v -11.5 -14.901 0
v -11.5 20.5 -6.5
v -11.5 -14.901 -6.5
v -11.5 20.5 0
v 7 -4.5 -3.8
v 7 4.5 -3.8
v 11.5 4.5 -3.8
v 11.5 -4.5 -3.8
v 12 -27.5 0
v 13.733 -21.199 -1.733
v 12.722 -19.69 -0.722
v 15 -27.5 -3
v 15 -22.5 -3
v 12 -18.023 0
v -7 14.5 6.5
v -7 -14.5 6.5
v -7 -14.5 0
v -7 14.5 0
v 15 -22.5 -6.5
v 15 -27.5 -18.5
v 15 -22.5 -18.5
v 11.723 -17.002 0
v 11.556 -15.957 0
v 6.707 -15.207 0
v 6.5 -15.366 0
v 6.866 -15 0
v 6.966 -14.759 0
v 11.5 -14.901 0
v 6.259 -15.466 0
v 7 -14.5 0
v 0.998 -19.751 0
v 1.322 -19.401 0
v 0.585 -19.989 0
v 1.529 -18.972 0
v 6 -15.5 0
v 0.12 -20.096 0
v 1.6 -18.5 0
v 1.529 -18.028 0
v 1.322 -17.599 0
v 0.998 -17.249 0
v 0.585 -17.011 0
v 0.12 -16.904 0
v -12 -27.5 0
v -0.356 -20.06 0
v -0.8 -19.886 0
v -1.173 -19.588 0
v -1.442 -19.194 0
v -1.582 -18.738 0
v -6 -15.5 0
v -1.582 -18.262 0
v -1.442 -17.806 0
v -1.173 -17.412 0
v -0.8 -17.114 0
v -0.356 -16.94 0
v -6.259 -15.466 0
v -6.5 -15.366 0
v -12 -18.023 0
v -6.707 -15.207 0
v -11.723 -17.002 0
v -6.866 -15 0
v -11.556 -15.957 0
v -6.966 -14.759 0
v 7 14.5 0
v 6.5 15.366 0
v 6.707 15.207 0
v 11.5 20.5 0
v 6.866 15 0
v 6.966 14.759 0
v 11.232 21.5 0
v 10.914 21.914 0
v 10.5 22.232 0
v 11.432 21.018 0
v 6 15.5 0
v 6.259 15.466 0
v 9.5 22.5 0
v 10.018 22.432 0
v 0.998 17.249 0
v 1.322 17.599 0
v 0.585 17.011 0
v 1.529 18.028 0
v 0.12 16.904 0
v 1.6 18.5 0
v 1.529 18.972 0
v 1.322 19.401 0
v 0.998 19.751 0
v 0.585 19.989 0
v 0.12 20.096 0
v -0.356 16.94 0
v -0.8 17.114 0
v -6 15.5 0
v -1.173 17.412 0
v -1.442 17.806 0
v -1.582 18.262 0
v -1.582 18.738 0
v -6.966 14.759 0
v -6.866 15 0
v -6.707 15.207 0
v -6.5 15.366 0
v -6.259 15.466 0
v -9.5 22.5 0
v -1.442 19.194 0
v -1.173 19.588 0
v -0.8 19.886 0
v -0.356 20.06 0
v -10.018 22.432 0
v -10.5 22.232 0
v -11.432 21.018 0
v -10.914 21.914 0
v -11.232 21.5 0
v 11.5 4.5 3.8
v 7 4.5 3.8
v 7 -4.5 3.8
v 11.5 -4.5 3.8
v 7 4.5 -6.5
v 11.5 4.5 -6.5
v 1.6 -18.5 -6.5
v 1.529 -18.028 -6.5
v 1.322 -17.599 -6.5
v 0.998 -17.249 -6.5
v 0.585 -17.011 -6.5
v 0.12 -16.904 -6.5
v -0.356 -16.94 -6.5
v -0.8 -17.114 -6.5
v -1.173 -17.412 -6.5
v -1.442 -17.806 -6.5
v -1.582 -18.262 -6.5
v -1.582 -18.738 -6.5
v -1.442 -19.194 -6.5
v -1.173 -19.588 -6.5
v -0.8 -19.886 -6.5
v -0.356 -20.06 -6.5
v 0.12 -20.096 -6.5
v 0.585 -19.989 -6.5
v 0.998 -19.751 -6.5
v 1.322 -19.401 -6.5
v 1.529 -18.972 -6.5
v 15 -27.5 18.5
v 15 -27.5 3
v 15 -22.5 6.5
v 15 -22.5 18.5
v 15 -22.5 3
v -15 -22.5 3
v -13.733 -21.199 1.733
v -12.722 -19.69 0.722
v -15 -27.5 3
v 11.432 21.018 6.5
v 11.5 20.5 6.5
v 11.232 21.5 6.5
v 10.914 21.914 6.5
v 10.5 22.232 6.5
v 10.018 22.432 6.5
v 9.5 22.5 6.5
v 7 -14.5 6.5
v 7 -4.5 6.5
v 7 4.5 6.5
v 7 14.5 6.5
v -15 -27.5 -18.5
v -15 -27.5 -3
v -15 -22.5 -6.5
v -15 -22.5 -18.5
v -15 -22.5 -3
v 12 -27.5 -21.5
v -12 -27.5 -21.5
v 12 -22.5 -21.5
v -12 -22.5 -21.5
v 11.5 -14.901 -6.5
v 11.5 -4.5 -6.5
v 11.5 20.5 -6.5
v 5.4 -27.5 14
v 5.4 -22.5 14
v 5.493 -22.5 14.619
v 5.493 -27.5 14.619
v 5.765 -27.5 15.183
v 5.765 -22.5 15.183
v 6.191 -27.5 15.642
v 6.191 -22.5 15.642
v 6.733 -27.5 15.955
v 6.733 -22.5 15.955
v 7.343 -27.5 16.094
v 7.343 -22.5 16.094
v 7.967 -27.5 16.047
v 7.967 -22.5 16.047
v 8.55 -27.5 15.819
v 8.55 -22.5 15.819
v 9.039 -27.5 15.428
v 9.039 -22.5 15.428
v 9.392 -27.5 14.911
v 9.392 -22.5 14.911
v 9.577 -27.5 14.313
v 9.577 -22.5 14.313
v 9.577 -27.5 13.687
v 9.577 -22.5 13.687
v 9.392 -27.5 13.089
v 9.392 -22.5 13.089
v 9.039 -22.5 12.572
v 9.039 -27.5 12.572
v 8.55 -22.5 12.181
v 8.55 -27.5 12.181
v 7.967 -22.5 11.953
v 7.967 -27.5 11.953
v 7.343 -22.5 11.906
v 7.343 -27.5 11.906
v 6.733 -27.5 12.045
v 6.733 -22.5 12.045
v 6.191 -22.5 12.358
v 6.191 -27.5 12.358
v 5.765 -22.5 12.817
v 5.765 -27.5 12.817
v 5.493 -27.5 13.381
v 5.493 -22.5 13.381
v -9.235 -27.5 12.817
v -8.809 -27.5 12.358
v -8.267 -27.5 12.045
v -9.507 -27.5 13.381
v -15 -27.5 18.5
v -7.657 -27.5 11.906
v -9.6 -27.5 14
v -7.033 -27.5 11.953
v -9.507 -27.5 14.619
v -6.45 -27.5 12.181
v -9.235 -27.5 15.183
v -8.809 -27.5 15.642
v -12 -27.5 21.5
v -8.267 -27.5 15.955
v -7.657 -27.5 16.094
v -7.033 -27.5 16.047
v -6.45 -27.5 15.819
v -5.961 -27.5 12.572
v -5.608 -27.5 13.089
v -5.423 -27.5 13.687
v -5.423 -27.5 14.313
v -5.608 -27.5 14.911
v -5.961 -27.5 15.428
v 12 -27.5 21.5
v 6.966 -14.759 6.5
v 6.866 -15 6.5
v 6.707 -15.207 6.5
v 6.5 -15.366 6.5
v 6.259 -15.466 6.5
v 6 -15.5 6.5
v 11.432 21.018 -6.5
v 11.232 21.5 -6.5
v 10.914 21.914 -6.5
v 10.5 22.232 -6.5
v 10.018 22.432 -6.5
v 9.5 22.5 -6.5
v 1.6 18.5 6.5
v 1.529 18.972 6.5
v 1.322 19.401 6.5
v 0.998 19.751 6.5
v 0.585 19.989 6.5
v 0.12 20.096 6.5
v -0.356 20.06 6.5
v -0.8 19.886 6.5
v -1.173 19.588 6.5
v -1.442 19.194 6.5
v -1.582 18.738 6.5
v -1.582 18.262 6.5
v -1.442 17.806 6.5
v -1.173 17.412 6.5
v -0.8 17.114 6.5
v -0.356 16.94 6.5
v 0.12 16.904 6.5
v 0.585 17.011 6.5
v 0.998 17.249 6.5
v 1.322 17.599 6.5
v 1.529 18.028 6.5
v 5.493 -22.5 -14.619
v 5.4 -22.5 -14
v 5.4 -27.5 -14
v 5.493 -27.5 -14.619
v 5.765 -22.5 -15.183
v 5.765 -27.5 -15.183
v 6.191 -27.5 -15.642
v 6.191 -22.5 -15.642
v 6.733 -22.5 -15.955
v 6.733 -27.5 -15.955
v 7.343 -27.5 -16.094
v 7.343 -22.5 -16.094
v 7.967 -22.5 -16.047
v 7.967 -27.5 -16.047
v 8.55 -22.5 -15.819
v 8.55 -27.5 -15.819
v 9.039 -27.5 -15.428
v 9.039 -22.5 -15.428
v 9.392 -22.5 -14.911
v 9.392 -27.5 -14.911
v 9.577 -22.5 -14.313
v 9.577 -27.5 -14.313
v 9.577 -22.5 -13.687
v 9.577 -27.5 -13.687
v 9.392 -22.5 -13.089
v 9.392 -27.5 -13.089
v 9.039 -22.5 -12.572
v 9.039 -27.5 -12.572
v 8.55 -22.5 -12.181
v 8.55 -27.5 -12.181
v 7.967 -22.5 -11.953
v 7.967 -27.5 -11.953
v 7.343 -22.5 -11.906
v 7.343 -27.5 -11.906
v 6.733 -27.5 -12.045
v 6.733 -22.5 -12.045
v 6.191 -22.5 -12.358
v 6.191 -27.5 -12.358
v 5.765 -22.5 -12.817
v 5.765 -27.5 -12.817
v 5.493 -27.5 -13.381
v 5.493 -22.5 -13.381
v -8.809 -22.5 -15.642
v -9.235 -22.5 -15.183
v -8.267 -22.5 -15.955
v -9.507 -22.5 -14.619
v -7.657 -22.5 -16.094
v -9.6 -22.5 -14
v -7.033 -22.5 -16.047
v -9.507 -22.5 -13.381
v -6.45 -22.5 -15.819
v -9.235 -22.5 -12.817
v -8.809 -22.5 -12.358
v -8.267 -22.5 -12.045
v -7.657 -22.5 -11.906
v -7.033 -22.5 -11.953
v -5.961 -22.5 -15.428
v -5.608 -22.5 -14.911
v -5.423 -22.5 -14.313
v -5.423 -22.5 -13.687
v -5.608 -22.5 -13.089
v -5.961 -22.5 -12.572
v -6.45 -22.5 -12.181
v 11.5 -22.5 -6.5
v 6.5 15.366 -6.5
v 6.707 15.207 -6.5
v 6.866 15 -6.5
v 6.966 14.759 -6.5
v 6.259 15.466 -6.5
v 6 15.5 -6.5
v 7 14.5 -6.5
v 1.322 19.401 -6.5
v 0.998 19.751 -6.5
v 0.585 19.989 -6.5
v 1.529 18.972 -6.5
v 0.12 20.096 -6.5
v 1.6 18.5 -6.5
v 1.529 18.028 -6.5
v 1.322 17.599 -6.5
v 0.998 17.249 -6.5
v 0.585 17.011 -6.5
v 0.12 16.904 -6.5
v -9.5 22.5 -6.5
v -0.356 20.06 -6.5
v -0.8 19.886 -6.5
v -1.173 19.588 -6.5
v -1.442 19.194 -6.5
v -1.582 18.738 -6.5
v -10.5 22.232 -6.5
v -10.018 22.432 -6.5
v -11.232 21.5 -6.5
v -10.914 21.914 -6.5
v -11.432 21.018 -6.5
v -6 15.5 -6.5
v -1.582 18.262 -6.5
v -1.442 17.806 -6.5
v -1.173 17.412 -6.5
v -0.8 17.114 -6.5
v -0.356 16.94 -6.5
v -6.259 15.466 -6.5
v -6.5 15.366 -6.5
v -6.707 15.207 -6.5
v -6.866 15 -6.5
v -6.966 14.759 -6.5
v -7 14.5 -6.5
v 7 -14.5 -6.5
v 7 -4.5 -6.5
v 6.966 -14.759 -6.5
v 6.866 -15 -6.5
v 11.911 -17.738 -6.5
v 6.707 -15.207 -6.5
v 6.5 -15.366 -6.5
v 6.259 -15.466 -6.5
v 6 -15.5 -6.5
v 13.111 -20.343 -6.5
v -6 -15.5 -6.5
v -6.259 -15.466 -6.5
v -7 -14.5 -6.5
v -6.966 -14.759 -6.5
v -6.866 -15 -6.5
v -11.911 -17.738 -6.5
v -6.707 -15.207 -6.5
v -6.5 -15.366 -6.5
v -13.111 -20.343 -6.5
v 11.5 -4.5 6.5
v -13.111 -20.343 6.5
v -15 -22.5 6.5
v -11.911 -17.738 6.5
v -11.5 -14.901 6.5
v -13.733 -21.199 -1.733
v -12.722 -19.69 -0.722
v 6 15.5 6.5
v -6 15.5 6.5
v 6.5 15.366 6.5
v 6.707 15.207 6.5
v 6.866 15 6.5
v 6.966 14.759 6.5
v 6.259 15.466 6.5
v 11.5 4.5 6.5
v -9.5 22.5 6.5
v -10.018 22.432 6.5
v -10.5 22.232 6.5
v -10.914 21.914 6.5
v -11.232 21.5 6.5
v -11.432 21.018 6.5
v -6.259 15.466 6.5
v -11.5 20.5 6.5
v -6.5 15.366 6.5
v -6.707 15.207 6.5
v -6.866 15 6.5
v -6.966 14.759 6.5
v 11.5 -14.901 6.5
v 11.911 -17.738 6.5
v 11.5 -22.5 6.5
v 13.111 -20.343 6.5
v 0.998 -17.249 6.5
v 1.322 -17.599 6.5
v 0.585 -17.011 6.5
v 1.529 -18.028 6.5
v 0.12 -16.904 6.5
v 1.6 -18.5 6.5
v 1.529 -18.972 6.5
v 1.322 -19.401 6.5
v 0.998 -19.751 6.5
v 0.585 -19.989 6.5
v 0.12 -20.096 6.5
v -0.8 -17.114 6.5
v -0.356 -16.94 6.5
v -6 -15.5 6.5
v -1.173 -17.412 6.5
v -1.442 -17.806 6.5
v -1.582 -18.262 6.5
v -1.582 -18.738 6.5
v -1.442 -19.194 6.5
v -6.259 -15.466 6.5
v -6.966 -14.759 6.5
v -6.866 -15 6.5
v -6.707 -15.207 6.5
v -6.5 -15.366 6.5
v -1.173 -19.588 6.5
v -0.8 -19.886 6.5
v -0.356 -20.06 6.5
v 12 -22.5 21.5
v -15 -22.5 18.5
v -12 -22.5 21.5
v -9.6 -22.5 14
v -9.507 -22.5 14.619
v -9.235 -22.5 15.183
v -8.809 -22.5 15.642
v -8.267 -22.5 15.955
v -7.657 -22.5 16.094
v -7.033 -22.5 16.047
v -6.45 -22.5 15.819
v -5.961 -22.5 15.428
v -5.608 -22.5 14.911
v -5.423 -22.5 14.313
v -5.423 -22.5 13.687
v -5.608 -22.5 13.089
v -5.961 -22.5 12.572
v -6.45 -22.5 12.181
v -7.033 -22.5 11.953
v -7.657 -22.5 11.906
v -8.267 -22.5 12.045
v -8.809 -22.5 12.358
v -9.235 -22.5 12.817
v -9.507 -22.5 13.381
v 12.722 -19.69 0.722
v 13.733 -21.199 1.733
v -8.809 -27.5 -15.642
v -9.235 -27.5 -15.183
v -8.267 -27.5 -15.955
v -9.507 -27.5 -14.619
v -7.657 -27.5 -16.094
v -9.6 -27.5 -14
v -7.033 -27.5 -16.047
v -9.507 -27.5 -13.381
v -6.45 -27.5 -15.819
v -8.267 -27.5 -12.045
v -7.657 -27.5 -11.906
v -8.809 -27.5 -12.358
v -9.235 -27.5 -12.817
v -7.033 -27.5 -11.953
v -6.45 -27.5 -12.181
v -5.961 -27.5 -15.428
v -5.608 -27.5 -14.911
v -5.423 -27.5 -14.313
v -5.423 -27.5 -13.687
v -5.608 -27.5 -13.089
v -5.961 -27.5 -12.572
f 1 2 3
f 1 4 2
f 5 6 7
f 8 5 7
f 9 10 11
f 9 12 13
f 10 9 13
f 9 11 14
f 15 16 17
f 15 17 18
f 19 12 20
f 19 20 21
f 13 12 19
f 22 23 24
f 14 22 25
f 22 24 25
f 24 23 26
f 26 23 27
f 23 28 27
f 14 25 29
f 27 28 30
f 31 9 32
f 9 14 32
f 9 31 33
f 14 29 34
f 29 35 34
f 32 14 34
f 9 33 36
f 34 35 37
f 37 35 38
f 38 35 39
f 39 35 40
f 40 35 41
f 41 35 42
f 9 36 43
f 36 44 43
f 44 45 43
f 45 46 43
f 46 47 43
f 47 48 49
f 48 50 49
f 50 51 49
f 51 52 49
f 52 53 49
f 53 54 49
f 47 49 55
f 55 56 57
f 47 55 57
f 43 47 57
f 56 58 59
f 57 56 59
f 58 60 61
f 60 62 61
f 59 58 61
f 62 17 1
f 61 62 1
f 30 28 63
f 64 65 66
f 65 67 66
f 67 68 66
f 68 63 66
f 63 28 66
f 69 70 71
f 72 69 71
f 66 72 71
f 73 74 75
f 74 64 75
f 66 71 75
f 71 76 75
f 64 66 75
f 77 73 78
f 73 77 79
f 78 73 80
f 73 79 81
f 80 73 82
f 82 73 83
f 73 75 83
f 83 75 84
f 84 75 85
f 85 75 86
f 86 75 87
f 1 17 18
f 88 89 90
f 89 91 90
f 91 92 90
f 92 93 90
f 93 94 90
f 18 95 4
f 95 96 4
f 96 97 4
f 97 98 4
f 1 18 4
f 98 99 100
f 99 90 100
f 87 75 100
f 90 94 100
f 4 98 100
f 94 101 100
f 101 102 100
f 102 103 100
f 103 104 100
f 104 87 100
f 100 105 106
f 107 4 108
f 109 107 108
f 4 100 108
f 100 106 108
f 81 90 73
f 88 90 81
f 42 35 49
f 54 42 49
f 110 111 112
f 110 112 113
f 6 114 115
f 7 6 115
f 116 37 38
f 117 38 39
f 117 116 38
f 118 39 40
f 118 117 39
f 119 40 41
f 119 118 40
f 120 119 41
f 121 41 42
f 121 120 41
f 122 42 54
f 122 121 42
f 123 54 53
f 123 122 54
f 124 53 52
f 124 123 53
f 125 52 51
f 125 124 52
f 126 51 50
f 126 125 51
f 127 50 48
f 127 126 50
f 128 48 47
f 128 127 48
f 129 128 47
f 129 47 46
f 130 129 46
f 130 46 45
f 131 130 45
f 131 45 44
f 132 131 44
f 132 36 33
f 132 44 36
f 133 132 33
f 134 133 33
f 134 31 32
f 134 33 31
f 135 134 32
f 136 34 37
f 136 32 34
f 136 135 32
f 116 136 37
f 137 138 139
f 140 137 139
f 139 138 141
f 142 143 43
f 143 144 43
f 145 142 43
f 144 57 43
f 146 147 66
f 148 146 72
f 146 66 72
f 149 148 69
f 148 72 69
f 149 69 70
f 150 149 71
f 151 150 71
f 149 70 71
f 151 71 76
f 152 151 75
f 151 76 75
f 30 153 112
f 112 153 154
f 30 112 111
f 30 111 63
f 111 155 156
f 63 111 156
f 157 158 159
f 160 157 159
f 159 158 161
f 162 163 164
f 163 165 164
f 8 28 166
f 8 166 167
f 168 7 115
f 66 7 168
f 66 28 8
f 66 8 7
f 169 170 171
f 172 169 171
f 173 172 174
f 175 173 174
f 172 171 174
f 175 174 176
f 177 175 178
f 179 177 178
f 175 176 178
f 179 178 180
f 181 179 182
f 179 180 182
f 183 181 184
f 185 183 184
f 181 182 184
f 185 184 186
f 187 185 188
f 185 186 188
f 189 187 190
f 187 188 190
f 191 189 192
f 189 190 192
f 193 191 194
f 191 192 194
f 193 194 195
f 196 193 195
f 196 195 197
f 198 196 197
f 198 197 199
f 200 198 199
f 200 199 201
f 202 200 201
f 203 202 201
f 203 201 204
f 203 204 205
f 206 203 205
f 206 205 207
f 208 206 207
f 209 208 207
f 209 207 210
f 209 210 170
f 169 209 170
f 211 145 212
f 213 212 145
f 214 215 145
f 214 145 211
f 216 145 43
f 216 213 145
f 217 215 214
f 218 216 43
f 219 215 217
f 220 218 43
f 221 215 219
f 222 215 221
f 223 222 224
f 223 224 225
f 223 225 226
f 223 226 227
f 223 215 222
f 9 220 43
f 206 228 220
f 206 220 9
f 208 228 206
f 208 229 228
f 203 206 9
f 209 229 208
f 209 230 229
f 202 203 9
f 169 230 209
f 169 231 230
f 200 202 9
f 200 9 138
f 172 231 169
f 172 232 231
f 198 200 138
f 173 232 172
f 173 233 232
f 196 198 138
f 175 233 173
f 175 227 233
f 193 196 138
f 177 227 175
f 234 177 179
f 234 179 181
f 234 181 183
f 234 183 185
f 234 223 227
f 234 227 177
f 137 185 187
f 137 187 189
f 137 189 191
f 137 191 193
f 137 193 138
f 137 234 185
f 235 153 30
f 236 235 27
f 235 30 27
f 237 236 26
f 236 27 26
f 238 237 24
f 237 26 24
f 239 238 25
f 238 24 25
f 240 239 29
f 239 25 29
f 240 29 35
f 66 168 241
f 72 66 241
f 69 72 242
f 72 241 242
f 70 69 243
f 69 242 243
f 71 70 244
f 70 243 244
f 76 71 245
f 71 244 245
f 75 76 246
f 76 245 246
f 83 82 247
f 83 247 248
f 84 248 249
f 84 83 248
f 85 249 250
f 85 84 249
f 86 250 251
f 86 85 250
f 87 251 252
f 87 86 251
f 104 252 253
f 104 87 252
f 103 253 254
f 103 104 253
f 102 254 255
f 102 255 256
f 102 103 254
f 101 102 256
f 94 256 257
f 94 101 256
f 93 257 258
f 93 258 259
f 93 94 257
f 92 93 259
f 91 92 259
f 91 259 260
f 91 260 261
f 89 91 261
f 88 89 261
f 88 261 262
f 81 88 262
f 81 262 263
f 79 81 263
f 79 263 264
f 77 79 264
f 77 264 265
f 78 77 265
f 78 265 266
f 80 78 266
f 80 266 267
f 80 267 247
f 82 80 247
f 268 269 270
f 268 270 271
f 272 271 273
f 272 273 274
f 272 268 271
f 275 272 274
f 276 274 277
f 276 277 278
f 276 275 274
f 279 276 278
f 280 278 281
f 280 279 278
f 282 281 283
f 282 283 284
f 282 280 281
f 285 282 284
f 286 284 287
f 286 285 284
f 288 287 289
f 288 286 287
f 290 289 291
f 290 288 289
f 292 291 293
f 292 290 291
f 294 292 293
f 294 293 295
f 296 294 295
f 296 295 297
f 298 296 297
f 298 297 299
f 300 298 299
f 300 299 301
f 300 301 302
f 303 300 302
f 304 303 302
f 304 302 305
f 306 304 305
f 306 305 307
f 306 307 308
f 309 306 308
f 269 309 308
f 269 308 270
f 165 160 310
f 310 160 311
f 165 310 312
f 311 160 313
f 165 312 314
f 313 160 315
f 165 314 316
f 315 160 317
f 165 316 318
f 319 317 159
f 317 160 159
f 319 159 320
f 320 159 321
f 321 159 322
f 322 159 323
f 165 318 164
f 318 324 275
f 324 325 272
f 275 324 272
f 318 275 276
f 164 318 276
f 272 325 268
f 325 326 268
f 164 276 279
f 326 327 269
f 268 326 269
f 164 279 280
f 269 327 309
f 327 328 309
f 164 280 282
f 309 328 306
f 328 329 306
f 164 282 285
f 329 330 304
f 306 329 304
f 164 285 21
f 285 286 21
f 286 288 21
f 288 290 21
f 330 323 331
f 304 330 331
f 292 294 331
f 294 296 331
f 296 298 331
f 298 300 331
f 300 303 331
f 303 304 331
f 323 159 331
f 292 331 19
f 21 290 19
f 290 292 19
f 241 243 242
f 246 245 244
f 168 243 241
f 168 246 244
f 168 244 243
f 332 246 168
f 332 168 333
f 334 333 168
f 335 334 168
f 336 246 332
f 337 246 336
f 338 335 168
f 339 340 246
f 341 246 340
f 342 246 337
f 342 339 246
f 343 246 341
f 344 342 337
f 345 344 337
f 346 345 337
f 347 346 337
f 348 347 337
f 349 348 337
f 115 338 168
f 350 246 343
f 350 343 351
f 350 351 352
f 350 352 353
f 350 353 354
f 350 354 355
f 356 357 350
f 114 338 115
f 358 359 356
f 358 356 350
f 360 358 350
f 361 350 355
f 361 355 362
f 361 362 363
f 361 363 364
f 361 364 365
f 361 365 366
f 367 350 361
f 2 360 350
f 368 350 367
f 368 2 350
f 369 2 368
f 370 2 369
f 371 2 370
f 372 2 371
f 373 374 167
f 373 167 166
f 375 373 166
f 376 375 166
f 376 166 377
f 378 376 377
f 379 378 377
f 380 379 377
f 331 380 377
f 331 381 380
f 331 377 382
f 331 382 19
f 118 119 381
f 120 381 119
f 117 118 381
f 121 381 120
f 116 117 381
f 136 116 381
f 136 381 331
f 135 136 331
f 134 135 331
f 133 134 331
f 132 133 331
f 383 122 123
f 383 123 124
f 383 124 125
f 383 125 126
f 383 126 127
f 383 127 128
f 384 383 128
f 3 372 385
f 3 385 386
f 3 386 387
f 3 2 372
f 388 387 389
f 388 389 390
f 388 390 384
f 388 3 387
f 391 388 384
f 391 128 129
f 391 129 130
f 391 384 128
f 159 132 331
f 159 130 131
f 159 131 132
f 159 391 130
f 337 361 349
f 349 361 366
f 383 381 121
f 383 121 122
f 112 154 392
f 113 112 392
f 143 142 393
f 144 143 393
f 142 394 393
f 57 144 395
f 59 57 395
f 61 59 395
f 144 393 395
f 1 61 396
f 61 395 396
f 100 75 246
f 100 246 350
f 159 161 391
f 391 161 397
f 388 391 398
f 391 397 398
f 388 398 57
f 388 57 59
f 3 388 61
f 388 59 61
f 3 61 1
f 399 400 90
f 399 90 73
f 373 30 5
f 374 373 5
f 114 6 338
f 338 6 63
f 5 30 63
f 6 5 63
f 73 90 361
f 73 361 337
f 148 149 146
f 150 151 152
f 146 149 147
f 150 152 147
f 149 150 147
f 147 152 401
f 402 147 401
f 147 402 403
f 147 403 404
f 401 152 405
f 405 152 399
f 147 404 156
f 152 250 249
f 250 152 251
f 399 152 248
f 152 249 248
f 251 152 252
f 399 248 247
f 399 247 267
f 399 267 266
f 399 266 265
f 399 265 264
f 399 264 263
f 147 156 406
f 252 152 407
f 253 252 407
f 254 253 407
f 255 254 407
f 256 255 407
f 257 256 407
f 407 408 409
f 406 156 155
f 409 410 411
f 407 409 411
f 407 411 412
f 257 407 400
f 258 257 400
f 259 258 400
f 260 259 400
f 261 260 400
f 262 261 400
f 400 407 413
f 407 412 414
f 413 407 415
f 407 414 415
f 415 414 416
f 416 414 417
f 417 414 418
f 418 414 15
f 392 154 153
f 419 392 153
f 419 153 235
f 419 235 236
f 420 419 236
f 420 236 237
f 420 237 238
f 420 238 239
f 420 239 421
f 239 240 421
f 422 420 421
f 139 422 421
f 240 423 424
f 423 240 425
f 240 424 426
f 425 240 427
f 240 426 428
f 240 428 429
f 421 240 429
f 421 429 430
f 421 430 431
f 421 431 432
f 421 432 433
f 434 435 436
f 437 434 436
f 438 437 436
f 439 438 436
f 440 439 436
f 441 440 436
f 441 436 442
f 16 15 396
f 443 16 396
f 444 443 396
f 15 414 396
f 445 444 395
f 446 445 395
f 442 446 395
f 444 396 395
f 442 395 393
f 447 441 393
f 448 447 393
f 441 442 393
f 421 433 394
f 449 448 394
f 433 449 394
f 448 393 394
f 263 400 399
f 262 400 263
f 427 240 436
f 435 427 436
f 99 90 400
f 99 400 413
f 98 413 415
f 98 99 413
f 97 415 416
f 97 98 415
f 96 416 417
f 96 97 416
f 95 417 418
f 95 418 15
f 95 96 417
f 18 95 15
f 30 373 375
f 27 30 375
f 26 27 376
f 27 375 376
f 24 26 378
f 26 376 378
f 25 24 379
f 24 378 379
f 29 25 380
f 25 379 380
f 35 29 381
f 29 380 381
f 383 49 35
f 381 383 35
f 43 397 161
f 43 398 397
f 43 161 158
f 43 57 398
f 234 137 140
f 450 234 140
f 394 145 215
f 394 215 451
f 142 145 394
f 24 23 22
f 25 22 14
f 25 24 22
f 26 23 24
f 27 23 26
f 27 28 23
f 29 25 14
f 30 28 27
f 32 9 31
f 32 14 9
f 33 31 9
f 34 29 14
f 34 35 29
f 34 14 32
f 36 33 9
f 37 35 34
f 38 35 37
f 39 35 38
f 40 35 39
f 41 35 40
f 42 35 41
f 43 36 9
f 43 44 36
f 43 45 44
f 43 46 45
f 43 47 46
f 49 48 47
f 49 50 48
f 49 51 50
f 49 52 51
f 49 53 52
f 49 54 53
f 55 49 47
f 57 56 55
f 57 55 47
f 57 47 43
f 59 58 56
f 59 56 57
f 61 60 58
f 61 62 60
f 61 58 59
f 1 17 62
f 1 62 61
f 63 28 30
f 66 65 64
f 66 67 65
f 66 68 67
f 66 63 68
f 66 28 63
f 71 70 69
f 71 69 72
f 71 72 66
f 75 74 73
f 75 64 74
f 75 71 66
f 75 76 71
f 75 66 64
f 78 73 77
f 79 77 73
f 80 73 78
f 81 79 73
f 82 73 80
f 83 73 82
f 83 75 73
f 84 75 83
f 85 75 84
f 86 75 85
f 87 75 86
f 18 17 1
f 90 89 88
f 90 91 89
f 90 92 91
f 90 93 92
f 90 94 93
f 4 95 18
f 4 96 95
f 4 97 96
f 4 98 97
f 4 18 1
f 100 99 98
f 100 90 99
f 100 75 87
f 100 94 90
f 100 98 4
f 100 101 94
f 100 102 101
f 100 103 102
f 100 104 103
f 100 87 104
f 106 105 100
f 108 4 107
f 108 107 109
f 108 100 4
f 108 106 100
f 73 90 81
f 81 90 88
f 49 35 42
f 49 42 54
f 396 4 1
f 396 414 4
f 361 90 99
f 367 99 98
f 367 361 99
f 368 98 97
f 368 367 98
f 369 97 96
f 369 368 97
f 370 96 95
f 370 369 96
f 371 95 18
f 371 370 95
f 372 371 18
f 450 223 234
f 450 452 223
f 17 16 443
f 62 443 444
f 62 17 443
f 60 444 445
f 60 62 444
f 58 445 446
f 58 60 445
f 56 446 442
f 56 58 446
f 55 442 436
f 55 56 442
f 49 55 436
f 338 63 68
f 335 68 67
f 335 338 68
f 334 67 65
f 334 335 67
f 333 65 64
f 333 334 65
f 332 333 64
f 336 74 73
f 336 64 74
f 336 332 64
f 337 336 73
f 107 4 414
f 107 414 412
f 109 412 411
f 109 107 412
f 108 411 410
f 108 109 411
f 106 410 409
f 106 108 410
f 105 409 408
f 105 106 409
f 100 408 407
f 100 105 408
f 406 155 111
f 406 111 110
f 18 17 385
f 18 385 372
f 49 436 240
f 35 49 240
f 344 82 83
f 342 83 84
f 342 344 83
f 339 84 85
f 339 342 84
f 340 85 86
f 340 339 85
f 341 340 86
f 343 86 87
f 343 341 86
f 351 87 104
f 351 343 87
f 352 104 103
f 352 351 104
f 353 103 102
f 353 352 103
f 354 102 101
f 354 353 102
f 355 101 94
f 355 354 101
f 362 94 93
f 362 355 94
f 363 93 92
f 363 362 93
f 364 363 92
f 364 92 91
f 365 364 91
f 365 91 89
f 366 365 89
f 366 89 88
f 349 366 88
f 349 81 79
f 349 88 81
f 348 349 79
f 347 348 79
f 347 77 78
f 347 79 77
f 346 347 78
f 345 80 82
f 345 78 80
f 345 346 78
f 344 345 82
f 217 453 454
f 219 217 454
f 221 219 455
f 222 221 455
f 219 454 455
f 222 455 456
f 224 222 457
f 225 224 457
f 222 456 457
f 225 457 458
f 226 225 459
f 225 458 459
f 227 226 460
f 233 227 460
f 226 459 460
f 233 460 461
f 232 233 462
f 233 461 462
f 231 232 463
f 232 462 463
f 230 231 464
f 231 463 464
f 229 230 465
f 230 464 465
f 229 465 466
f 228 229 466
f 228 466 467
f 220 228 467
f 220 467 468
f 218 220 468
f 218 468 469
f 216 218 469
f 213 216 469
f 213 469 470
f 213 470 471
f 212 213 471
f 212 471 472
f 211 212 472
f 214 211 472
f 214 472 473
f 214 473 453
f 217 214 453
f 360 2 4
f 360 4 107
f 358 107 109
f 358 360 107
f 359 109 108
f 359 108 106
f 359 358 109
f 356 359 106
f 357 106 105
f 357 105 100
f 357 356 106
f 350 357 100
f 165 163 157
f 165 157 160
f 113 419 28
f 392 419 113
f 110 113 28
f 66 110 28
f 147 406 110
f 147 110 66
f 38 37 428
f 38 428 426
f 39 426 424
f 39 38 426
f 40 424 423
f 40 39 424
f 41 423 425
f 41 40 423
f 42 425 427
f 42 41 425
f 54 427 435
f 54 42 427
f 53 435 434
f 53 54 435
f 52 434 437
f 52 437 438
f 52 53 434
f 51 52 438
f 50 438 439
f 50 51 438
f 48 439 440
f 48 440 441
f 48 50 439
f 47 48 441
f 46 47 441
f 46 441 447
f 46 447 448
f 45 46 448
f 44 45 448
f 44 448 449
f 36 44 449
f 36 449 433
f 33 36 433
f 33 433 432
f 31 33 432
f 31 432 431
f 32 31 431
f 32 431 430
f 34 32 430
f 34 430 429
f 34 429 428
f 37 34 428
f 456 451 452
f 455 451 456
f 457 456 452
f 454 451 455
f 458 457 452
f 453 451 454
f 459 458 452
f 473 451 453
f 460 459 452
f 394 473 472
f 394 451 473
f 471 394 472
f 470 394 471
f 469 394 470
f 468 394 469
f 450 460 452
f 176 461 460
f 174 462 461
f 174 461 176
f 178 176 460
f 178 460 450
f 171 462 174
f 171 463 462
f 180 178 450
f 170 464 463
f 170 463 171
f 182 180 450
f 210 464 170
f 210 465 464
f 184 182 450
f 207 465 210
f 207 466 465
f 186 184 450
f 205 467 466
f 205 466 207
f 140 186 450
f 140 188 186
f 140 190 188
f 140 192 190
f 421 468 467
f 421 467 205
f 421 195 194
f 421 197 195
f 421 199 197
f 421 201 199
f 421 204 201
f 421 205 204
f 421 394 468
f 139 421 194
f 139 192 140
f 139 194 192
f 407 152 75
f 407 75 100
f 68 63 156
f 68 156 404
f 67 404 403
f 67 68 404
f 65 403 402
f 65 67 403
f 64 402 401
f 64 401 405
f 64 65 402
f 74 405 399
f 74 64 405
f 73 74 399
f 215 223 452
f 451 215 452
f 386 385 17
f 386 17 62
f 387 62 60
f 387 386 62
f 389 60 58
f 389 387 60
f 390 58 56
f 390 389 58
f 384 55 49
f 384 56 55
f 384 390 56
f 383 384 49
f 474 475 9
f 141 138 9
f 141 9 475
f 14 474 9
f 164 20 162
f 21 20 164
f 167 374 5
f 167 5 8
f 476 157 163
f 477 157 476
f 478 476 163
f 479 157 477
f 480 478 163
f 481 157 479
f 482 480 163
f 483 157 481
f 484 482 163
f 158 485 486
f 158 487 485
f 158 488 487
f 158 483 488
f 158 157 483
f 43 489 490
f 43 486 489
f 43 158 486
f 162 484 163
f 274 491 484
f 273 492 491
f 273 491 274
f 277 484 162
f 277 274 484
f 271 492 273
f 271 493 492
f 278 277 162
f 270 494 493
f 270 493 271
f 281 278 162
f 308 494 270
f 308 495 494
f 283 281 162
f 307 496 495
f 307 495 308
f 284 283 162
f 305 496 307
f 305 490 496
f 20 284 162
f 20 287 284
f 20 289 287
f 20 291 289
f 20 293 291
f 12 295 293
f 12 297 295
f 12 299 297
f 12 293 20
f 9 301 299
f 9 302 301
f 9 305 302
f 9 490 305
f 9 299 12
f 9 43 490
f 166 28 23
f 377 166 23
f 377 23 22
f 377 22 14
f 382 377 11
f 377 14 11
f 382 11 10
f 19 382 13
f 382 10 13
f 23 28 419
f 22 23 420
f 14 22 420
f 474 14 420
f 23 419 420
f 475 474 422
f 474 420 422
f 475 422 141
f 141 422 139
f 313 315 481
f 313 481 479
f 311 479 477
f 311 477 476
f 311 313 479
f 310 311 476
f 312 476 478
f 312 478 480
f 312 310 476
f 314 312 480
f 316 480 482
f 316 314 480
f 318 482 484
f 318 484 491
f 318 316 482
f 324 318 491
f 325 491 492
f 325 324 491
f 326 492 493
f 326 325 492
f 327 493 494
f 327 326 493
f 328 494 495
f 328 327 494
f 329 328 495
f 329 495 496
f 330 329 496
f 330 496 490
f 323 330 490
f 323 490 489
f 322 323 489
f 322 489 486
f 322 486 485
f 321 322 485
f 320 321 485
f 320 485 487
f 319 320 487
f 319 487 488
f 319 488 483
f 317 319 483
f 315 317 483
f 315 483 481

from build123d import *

# Parameters (mm, degrees)
SKETCH_1_W             = 14
SKETCH_1_H             = 31
EXTRUDE_1_DEPTH        = 6.5
SKETCH_2_W             = 30
SKETCH_2_H             = 5
EXTRUDE_2_DEPTH        = 15
SKETCH_3_W             = 4.5
SKETCH_3_H             = 9
CUT_EXTRUDE_1_DEPTH    = 2.7
SKETCH_4_R             = 1.6
CUT_EXTRUDE_2_DEPTH    = 35.731109974
PATTERN_LINEAR_1_COUNT = 2
PATTERN_LINEAR_1_PITCH = 37
SKETCH_5_R             = 2.1
CUT_EXTRUDE_3_DEPTH    = 53.079266508
FILLET_2_R             = 2
FILLET_3_R             = 10
CHAMFER_1_SIZE         = 3
FILLET_4_R             = 1


with BuildPart() as part:
    # 草圖1 → 填料-伸長1 (new body)
    with BuildSketch(Plane.XY):
        Polygon((11.5, -22.5), (11.5, 22.5), (-11.5, 22.5), (-11.5, -22.5), (-15, -22.5), (-15, -27.5), (15, -27.5), (15, -22.5), align=None)
        Rectangle(SKETCH_1_W, SKETCH_1_H, mode=Mode.SUBTRACT)
    extrude(amount=EXTRUDE_1_DEPTH)

    # 草圖2 → 填料-伸長2 (add)
    with BuildSketch(Plane.XY.offset(6.5)):
        with Locations((0, -25)):
            Rectangle(SKETCH_2_W, SKETCH_2_H)
    extrude(amount=EXTRUDE_2_DEPTH)

    # 草圖3 → 除料-伸長1 (cut)
    with BuildSketch(Plane.XY.offset(6.5)):
        with Locations((9.25, 0)):
            Rectangle(SKETCH_3_W, SKETCH_3_H)
    extrude(amount=-CUT_EXTRUDE_1_DEPTH, mode=Mode.SUBTRACT)

    # 草圖4 → 除料-伸長2 (cut, through all)
    with BuildSketch(Plane.XY.offset(6.5)):
        with Locations((0, 18.5)):
            Circle(SKETCH_4_R)
    cut_extrude_2 = extrude(amount=-CUT_EXTRUDE_2_DEPTH, mode=Mode.SUBTRACT)

    # 直線複製排列1: 除料-伸長2 ×2
    with Locations(*[(0, -i * PATTERN_LINEAR_1_PITCH, 0) for i in range(1, PATTERN_LINEAR_1_COUNT)]):
        add(cut_extrude_2, mode=Mode.SUBTRACT)

    # 草圖5 → 除料-伸長3 (cut, through all)
    with BuildSketch(Plane(origin=(0, -22.5, 0), x_dir=(1, 0, 0), z_dir=(0, 1, 0))):
        with Locations(Location((-7.5, -14, 0), (0, 0, 180))):
            Circle(SKETCH_5_R)
        with Locations(Location((7.5, -14, 0), (0, 0, 180))):
            Circle(SKETCH_5_R)
    extrude(amount=-CUT_EXTRUDE_3_DEPTH, mode=Mode.SUBTRACT)

    # 圓角2
    fillet_2_edges = [part.edges().sort_by_distance(p)[0] for p in [
        (-11.5, 22.5, 3.25),
        (11.5, 22.5, 3.25),
    ]]
    fillet(fillet_2_edges, radius=FILLET_2_R)

    # 圓角3
    # the kernel refuses this fillet: 10 mm, written as the material it adds along each edge
    with BuildSketch(Plane(origin=(-11.5, -22.5, 0), x_dir=(-1, 0, 0), z_dir=(0, 0, 1))) as fillet_3_piece_1:
        with BuildLine():
            CenterArc((10, -7.599342077), FILLET_3_R, 130.541601874, 49.458398126)
            Line((0, -7.599342077), (-0.2, -7.599342077))
            Line((-0.2, -7.599342077), (-0.2, 0))
            Line((-0.2, 0), (0, 0.2))
            ThreePointArc((0, 0.2), (1.75, 0.2), (3.37, 0.151986842))
            Line((3.37, 0.151986842), (3.5, 0))
        make_face()
    extrude(amount=6.5)
    with BuildSketch(Plane(origin=(11.5, -22.5, 0), x_dir=(0, 1, 0), z_dir=(0, 0, 1))) as fillet_3_piece_2:
        with BuildLine():
            CenterArc((7.599342077, -10), FILLET_3_R, 90, 49.458398126)
            Line((0, -3.5), (-0.151986842, -3.37))
            ThreePointArc((-0.151986842, -3.37), (-0.2, -1.75), (-0.2, 0))
            Line((-0.2, 0), (0, 0.2))
            Line((0, 0.2), (7.599342077, 0.2))
            Line((7.599342077, 0.2), (7.599342077, 0))
        make_face()
    extrude(amount=6.5)

    # 導角1
    chamfer_1_edges = [part.edges().sort_by_distance(p)[0] for p in [
        (-15, -25, 0),
        (15, -25, 0),
        (-15, -25, 21.5),
        (15, -25, 21.5),
    ]]
    chamfer(chamfer_1_edges, length=CHAMFER_1_SIZE)

    # 圓角4
    fillet_4_edges = [part.edges().sort_by_distance(p)[0] for p in [
        (7, -15.5, 3.25),
        (7, 15.5, 3.25),
        (-7, 15.5, 3.25),
        (-7, -15.5, 3.25),
    ]]
    fillet(fillet_4_edges, radius=FILLET_4_R)

    # 鏡射2: part across plane


with BuildPart() as part_1:
    add(part.part)
    add(part.part.mirror(Plane(origin=(0, 0, 0), x_dir=(1, 0, 0), z_dir=(0, 0, -1))))


with BuildPart() as body_2:
    # Split Bodies 1: the piece on the far side of the plane
    add(part_1.part)
    split(bisect_by=Plane(origin=(0, 0, 0), x_dir=(-1, 0, 0), z_dir=(0, 0, -1)), keep=Keep.BOTTOM)


with BuildPart() as part_2:
    add(part_1.part)

    # Split Bodies 1
    split(bisect_by=Plane(origin=(0, 0, 0), x_dir=(-1, 0, 0), z_dir=(0, 0, -1)), keep=Keep.TOP)


solid = Compound([body_2.part, part_2.part])
